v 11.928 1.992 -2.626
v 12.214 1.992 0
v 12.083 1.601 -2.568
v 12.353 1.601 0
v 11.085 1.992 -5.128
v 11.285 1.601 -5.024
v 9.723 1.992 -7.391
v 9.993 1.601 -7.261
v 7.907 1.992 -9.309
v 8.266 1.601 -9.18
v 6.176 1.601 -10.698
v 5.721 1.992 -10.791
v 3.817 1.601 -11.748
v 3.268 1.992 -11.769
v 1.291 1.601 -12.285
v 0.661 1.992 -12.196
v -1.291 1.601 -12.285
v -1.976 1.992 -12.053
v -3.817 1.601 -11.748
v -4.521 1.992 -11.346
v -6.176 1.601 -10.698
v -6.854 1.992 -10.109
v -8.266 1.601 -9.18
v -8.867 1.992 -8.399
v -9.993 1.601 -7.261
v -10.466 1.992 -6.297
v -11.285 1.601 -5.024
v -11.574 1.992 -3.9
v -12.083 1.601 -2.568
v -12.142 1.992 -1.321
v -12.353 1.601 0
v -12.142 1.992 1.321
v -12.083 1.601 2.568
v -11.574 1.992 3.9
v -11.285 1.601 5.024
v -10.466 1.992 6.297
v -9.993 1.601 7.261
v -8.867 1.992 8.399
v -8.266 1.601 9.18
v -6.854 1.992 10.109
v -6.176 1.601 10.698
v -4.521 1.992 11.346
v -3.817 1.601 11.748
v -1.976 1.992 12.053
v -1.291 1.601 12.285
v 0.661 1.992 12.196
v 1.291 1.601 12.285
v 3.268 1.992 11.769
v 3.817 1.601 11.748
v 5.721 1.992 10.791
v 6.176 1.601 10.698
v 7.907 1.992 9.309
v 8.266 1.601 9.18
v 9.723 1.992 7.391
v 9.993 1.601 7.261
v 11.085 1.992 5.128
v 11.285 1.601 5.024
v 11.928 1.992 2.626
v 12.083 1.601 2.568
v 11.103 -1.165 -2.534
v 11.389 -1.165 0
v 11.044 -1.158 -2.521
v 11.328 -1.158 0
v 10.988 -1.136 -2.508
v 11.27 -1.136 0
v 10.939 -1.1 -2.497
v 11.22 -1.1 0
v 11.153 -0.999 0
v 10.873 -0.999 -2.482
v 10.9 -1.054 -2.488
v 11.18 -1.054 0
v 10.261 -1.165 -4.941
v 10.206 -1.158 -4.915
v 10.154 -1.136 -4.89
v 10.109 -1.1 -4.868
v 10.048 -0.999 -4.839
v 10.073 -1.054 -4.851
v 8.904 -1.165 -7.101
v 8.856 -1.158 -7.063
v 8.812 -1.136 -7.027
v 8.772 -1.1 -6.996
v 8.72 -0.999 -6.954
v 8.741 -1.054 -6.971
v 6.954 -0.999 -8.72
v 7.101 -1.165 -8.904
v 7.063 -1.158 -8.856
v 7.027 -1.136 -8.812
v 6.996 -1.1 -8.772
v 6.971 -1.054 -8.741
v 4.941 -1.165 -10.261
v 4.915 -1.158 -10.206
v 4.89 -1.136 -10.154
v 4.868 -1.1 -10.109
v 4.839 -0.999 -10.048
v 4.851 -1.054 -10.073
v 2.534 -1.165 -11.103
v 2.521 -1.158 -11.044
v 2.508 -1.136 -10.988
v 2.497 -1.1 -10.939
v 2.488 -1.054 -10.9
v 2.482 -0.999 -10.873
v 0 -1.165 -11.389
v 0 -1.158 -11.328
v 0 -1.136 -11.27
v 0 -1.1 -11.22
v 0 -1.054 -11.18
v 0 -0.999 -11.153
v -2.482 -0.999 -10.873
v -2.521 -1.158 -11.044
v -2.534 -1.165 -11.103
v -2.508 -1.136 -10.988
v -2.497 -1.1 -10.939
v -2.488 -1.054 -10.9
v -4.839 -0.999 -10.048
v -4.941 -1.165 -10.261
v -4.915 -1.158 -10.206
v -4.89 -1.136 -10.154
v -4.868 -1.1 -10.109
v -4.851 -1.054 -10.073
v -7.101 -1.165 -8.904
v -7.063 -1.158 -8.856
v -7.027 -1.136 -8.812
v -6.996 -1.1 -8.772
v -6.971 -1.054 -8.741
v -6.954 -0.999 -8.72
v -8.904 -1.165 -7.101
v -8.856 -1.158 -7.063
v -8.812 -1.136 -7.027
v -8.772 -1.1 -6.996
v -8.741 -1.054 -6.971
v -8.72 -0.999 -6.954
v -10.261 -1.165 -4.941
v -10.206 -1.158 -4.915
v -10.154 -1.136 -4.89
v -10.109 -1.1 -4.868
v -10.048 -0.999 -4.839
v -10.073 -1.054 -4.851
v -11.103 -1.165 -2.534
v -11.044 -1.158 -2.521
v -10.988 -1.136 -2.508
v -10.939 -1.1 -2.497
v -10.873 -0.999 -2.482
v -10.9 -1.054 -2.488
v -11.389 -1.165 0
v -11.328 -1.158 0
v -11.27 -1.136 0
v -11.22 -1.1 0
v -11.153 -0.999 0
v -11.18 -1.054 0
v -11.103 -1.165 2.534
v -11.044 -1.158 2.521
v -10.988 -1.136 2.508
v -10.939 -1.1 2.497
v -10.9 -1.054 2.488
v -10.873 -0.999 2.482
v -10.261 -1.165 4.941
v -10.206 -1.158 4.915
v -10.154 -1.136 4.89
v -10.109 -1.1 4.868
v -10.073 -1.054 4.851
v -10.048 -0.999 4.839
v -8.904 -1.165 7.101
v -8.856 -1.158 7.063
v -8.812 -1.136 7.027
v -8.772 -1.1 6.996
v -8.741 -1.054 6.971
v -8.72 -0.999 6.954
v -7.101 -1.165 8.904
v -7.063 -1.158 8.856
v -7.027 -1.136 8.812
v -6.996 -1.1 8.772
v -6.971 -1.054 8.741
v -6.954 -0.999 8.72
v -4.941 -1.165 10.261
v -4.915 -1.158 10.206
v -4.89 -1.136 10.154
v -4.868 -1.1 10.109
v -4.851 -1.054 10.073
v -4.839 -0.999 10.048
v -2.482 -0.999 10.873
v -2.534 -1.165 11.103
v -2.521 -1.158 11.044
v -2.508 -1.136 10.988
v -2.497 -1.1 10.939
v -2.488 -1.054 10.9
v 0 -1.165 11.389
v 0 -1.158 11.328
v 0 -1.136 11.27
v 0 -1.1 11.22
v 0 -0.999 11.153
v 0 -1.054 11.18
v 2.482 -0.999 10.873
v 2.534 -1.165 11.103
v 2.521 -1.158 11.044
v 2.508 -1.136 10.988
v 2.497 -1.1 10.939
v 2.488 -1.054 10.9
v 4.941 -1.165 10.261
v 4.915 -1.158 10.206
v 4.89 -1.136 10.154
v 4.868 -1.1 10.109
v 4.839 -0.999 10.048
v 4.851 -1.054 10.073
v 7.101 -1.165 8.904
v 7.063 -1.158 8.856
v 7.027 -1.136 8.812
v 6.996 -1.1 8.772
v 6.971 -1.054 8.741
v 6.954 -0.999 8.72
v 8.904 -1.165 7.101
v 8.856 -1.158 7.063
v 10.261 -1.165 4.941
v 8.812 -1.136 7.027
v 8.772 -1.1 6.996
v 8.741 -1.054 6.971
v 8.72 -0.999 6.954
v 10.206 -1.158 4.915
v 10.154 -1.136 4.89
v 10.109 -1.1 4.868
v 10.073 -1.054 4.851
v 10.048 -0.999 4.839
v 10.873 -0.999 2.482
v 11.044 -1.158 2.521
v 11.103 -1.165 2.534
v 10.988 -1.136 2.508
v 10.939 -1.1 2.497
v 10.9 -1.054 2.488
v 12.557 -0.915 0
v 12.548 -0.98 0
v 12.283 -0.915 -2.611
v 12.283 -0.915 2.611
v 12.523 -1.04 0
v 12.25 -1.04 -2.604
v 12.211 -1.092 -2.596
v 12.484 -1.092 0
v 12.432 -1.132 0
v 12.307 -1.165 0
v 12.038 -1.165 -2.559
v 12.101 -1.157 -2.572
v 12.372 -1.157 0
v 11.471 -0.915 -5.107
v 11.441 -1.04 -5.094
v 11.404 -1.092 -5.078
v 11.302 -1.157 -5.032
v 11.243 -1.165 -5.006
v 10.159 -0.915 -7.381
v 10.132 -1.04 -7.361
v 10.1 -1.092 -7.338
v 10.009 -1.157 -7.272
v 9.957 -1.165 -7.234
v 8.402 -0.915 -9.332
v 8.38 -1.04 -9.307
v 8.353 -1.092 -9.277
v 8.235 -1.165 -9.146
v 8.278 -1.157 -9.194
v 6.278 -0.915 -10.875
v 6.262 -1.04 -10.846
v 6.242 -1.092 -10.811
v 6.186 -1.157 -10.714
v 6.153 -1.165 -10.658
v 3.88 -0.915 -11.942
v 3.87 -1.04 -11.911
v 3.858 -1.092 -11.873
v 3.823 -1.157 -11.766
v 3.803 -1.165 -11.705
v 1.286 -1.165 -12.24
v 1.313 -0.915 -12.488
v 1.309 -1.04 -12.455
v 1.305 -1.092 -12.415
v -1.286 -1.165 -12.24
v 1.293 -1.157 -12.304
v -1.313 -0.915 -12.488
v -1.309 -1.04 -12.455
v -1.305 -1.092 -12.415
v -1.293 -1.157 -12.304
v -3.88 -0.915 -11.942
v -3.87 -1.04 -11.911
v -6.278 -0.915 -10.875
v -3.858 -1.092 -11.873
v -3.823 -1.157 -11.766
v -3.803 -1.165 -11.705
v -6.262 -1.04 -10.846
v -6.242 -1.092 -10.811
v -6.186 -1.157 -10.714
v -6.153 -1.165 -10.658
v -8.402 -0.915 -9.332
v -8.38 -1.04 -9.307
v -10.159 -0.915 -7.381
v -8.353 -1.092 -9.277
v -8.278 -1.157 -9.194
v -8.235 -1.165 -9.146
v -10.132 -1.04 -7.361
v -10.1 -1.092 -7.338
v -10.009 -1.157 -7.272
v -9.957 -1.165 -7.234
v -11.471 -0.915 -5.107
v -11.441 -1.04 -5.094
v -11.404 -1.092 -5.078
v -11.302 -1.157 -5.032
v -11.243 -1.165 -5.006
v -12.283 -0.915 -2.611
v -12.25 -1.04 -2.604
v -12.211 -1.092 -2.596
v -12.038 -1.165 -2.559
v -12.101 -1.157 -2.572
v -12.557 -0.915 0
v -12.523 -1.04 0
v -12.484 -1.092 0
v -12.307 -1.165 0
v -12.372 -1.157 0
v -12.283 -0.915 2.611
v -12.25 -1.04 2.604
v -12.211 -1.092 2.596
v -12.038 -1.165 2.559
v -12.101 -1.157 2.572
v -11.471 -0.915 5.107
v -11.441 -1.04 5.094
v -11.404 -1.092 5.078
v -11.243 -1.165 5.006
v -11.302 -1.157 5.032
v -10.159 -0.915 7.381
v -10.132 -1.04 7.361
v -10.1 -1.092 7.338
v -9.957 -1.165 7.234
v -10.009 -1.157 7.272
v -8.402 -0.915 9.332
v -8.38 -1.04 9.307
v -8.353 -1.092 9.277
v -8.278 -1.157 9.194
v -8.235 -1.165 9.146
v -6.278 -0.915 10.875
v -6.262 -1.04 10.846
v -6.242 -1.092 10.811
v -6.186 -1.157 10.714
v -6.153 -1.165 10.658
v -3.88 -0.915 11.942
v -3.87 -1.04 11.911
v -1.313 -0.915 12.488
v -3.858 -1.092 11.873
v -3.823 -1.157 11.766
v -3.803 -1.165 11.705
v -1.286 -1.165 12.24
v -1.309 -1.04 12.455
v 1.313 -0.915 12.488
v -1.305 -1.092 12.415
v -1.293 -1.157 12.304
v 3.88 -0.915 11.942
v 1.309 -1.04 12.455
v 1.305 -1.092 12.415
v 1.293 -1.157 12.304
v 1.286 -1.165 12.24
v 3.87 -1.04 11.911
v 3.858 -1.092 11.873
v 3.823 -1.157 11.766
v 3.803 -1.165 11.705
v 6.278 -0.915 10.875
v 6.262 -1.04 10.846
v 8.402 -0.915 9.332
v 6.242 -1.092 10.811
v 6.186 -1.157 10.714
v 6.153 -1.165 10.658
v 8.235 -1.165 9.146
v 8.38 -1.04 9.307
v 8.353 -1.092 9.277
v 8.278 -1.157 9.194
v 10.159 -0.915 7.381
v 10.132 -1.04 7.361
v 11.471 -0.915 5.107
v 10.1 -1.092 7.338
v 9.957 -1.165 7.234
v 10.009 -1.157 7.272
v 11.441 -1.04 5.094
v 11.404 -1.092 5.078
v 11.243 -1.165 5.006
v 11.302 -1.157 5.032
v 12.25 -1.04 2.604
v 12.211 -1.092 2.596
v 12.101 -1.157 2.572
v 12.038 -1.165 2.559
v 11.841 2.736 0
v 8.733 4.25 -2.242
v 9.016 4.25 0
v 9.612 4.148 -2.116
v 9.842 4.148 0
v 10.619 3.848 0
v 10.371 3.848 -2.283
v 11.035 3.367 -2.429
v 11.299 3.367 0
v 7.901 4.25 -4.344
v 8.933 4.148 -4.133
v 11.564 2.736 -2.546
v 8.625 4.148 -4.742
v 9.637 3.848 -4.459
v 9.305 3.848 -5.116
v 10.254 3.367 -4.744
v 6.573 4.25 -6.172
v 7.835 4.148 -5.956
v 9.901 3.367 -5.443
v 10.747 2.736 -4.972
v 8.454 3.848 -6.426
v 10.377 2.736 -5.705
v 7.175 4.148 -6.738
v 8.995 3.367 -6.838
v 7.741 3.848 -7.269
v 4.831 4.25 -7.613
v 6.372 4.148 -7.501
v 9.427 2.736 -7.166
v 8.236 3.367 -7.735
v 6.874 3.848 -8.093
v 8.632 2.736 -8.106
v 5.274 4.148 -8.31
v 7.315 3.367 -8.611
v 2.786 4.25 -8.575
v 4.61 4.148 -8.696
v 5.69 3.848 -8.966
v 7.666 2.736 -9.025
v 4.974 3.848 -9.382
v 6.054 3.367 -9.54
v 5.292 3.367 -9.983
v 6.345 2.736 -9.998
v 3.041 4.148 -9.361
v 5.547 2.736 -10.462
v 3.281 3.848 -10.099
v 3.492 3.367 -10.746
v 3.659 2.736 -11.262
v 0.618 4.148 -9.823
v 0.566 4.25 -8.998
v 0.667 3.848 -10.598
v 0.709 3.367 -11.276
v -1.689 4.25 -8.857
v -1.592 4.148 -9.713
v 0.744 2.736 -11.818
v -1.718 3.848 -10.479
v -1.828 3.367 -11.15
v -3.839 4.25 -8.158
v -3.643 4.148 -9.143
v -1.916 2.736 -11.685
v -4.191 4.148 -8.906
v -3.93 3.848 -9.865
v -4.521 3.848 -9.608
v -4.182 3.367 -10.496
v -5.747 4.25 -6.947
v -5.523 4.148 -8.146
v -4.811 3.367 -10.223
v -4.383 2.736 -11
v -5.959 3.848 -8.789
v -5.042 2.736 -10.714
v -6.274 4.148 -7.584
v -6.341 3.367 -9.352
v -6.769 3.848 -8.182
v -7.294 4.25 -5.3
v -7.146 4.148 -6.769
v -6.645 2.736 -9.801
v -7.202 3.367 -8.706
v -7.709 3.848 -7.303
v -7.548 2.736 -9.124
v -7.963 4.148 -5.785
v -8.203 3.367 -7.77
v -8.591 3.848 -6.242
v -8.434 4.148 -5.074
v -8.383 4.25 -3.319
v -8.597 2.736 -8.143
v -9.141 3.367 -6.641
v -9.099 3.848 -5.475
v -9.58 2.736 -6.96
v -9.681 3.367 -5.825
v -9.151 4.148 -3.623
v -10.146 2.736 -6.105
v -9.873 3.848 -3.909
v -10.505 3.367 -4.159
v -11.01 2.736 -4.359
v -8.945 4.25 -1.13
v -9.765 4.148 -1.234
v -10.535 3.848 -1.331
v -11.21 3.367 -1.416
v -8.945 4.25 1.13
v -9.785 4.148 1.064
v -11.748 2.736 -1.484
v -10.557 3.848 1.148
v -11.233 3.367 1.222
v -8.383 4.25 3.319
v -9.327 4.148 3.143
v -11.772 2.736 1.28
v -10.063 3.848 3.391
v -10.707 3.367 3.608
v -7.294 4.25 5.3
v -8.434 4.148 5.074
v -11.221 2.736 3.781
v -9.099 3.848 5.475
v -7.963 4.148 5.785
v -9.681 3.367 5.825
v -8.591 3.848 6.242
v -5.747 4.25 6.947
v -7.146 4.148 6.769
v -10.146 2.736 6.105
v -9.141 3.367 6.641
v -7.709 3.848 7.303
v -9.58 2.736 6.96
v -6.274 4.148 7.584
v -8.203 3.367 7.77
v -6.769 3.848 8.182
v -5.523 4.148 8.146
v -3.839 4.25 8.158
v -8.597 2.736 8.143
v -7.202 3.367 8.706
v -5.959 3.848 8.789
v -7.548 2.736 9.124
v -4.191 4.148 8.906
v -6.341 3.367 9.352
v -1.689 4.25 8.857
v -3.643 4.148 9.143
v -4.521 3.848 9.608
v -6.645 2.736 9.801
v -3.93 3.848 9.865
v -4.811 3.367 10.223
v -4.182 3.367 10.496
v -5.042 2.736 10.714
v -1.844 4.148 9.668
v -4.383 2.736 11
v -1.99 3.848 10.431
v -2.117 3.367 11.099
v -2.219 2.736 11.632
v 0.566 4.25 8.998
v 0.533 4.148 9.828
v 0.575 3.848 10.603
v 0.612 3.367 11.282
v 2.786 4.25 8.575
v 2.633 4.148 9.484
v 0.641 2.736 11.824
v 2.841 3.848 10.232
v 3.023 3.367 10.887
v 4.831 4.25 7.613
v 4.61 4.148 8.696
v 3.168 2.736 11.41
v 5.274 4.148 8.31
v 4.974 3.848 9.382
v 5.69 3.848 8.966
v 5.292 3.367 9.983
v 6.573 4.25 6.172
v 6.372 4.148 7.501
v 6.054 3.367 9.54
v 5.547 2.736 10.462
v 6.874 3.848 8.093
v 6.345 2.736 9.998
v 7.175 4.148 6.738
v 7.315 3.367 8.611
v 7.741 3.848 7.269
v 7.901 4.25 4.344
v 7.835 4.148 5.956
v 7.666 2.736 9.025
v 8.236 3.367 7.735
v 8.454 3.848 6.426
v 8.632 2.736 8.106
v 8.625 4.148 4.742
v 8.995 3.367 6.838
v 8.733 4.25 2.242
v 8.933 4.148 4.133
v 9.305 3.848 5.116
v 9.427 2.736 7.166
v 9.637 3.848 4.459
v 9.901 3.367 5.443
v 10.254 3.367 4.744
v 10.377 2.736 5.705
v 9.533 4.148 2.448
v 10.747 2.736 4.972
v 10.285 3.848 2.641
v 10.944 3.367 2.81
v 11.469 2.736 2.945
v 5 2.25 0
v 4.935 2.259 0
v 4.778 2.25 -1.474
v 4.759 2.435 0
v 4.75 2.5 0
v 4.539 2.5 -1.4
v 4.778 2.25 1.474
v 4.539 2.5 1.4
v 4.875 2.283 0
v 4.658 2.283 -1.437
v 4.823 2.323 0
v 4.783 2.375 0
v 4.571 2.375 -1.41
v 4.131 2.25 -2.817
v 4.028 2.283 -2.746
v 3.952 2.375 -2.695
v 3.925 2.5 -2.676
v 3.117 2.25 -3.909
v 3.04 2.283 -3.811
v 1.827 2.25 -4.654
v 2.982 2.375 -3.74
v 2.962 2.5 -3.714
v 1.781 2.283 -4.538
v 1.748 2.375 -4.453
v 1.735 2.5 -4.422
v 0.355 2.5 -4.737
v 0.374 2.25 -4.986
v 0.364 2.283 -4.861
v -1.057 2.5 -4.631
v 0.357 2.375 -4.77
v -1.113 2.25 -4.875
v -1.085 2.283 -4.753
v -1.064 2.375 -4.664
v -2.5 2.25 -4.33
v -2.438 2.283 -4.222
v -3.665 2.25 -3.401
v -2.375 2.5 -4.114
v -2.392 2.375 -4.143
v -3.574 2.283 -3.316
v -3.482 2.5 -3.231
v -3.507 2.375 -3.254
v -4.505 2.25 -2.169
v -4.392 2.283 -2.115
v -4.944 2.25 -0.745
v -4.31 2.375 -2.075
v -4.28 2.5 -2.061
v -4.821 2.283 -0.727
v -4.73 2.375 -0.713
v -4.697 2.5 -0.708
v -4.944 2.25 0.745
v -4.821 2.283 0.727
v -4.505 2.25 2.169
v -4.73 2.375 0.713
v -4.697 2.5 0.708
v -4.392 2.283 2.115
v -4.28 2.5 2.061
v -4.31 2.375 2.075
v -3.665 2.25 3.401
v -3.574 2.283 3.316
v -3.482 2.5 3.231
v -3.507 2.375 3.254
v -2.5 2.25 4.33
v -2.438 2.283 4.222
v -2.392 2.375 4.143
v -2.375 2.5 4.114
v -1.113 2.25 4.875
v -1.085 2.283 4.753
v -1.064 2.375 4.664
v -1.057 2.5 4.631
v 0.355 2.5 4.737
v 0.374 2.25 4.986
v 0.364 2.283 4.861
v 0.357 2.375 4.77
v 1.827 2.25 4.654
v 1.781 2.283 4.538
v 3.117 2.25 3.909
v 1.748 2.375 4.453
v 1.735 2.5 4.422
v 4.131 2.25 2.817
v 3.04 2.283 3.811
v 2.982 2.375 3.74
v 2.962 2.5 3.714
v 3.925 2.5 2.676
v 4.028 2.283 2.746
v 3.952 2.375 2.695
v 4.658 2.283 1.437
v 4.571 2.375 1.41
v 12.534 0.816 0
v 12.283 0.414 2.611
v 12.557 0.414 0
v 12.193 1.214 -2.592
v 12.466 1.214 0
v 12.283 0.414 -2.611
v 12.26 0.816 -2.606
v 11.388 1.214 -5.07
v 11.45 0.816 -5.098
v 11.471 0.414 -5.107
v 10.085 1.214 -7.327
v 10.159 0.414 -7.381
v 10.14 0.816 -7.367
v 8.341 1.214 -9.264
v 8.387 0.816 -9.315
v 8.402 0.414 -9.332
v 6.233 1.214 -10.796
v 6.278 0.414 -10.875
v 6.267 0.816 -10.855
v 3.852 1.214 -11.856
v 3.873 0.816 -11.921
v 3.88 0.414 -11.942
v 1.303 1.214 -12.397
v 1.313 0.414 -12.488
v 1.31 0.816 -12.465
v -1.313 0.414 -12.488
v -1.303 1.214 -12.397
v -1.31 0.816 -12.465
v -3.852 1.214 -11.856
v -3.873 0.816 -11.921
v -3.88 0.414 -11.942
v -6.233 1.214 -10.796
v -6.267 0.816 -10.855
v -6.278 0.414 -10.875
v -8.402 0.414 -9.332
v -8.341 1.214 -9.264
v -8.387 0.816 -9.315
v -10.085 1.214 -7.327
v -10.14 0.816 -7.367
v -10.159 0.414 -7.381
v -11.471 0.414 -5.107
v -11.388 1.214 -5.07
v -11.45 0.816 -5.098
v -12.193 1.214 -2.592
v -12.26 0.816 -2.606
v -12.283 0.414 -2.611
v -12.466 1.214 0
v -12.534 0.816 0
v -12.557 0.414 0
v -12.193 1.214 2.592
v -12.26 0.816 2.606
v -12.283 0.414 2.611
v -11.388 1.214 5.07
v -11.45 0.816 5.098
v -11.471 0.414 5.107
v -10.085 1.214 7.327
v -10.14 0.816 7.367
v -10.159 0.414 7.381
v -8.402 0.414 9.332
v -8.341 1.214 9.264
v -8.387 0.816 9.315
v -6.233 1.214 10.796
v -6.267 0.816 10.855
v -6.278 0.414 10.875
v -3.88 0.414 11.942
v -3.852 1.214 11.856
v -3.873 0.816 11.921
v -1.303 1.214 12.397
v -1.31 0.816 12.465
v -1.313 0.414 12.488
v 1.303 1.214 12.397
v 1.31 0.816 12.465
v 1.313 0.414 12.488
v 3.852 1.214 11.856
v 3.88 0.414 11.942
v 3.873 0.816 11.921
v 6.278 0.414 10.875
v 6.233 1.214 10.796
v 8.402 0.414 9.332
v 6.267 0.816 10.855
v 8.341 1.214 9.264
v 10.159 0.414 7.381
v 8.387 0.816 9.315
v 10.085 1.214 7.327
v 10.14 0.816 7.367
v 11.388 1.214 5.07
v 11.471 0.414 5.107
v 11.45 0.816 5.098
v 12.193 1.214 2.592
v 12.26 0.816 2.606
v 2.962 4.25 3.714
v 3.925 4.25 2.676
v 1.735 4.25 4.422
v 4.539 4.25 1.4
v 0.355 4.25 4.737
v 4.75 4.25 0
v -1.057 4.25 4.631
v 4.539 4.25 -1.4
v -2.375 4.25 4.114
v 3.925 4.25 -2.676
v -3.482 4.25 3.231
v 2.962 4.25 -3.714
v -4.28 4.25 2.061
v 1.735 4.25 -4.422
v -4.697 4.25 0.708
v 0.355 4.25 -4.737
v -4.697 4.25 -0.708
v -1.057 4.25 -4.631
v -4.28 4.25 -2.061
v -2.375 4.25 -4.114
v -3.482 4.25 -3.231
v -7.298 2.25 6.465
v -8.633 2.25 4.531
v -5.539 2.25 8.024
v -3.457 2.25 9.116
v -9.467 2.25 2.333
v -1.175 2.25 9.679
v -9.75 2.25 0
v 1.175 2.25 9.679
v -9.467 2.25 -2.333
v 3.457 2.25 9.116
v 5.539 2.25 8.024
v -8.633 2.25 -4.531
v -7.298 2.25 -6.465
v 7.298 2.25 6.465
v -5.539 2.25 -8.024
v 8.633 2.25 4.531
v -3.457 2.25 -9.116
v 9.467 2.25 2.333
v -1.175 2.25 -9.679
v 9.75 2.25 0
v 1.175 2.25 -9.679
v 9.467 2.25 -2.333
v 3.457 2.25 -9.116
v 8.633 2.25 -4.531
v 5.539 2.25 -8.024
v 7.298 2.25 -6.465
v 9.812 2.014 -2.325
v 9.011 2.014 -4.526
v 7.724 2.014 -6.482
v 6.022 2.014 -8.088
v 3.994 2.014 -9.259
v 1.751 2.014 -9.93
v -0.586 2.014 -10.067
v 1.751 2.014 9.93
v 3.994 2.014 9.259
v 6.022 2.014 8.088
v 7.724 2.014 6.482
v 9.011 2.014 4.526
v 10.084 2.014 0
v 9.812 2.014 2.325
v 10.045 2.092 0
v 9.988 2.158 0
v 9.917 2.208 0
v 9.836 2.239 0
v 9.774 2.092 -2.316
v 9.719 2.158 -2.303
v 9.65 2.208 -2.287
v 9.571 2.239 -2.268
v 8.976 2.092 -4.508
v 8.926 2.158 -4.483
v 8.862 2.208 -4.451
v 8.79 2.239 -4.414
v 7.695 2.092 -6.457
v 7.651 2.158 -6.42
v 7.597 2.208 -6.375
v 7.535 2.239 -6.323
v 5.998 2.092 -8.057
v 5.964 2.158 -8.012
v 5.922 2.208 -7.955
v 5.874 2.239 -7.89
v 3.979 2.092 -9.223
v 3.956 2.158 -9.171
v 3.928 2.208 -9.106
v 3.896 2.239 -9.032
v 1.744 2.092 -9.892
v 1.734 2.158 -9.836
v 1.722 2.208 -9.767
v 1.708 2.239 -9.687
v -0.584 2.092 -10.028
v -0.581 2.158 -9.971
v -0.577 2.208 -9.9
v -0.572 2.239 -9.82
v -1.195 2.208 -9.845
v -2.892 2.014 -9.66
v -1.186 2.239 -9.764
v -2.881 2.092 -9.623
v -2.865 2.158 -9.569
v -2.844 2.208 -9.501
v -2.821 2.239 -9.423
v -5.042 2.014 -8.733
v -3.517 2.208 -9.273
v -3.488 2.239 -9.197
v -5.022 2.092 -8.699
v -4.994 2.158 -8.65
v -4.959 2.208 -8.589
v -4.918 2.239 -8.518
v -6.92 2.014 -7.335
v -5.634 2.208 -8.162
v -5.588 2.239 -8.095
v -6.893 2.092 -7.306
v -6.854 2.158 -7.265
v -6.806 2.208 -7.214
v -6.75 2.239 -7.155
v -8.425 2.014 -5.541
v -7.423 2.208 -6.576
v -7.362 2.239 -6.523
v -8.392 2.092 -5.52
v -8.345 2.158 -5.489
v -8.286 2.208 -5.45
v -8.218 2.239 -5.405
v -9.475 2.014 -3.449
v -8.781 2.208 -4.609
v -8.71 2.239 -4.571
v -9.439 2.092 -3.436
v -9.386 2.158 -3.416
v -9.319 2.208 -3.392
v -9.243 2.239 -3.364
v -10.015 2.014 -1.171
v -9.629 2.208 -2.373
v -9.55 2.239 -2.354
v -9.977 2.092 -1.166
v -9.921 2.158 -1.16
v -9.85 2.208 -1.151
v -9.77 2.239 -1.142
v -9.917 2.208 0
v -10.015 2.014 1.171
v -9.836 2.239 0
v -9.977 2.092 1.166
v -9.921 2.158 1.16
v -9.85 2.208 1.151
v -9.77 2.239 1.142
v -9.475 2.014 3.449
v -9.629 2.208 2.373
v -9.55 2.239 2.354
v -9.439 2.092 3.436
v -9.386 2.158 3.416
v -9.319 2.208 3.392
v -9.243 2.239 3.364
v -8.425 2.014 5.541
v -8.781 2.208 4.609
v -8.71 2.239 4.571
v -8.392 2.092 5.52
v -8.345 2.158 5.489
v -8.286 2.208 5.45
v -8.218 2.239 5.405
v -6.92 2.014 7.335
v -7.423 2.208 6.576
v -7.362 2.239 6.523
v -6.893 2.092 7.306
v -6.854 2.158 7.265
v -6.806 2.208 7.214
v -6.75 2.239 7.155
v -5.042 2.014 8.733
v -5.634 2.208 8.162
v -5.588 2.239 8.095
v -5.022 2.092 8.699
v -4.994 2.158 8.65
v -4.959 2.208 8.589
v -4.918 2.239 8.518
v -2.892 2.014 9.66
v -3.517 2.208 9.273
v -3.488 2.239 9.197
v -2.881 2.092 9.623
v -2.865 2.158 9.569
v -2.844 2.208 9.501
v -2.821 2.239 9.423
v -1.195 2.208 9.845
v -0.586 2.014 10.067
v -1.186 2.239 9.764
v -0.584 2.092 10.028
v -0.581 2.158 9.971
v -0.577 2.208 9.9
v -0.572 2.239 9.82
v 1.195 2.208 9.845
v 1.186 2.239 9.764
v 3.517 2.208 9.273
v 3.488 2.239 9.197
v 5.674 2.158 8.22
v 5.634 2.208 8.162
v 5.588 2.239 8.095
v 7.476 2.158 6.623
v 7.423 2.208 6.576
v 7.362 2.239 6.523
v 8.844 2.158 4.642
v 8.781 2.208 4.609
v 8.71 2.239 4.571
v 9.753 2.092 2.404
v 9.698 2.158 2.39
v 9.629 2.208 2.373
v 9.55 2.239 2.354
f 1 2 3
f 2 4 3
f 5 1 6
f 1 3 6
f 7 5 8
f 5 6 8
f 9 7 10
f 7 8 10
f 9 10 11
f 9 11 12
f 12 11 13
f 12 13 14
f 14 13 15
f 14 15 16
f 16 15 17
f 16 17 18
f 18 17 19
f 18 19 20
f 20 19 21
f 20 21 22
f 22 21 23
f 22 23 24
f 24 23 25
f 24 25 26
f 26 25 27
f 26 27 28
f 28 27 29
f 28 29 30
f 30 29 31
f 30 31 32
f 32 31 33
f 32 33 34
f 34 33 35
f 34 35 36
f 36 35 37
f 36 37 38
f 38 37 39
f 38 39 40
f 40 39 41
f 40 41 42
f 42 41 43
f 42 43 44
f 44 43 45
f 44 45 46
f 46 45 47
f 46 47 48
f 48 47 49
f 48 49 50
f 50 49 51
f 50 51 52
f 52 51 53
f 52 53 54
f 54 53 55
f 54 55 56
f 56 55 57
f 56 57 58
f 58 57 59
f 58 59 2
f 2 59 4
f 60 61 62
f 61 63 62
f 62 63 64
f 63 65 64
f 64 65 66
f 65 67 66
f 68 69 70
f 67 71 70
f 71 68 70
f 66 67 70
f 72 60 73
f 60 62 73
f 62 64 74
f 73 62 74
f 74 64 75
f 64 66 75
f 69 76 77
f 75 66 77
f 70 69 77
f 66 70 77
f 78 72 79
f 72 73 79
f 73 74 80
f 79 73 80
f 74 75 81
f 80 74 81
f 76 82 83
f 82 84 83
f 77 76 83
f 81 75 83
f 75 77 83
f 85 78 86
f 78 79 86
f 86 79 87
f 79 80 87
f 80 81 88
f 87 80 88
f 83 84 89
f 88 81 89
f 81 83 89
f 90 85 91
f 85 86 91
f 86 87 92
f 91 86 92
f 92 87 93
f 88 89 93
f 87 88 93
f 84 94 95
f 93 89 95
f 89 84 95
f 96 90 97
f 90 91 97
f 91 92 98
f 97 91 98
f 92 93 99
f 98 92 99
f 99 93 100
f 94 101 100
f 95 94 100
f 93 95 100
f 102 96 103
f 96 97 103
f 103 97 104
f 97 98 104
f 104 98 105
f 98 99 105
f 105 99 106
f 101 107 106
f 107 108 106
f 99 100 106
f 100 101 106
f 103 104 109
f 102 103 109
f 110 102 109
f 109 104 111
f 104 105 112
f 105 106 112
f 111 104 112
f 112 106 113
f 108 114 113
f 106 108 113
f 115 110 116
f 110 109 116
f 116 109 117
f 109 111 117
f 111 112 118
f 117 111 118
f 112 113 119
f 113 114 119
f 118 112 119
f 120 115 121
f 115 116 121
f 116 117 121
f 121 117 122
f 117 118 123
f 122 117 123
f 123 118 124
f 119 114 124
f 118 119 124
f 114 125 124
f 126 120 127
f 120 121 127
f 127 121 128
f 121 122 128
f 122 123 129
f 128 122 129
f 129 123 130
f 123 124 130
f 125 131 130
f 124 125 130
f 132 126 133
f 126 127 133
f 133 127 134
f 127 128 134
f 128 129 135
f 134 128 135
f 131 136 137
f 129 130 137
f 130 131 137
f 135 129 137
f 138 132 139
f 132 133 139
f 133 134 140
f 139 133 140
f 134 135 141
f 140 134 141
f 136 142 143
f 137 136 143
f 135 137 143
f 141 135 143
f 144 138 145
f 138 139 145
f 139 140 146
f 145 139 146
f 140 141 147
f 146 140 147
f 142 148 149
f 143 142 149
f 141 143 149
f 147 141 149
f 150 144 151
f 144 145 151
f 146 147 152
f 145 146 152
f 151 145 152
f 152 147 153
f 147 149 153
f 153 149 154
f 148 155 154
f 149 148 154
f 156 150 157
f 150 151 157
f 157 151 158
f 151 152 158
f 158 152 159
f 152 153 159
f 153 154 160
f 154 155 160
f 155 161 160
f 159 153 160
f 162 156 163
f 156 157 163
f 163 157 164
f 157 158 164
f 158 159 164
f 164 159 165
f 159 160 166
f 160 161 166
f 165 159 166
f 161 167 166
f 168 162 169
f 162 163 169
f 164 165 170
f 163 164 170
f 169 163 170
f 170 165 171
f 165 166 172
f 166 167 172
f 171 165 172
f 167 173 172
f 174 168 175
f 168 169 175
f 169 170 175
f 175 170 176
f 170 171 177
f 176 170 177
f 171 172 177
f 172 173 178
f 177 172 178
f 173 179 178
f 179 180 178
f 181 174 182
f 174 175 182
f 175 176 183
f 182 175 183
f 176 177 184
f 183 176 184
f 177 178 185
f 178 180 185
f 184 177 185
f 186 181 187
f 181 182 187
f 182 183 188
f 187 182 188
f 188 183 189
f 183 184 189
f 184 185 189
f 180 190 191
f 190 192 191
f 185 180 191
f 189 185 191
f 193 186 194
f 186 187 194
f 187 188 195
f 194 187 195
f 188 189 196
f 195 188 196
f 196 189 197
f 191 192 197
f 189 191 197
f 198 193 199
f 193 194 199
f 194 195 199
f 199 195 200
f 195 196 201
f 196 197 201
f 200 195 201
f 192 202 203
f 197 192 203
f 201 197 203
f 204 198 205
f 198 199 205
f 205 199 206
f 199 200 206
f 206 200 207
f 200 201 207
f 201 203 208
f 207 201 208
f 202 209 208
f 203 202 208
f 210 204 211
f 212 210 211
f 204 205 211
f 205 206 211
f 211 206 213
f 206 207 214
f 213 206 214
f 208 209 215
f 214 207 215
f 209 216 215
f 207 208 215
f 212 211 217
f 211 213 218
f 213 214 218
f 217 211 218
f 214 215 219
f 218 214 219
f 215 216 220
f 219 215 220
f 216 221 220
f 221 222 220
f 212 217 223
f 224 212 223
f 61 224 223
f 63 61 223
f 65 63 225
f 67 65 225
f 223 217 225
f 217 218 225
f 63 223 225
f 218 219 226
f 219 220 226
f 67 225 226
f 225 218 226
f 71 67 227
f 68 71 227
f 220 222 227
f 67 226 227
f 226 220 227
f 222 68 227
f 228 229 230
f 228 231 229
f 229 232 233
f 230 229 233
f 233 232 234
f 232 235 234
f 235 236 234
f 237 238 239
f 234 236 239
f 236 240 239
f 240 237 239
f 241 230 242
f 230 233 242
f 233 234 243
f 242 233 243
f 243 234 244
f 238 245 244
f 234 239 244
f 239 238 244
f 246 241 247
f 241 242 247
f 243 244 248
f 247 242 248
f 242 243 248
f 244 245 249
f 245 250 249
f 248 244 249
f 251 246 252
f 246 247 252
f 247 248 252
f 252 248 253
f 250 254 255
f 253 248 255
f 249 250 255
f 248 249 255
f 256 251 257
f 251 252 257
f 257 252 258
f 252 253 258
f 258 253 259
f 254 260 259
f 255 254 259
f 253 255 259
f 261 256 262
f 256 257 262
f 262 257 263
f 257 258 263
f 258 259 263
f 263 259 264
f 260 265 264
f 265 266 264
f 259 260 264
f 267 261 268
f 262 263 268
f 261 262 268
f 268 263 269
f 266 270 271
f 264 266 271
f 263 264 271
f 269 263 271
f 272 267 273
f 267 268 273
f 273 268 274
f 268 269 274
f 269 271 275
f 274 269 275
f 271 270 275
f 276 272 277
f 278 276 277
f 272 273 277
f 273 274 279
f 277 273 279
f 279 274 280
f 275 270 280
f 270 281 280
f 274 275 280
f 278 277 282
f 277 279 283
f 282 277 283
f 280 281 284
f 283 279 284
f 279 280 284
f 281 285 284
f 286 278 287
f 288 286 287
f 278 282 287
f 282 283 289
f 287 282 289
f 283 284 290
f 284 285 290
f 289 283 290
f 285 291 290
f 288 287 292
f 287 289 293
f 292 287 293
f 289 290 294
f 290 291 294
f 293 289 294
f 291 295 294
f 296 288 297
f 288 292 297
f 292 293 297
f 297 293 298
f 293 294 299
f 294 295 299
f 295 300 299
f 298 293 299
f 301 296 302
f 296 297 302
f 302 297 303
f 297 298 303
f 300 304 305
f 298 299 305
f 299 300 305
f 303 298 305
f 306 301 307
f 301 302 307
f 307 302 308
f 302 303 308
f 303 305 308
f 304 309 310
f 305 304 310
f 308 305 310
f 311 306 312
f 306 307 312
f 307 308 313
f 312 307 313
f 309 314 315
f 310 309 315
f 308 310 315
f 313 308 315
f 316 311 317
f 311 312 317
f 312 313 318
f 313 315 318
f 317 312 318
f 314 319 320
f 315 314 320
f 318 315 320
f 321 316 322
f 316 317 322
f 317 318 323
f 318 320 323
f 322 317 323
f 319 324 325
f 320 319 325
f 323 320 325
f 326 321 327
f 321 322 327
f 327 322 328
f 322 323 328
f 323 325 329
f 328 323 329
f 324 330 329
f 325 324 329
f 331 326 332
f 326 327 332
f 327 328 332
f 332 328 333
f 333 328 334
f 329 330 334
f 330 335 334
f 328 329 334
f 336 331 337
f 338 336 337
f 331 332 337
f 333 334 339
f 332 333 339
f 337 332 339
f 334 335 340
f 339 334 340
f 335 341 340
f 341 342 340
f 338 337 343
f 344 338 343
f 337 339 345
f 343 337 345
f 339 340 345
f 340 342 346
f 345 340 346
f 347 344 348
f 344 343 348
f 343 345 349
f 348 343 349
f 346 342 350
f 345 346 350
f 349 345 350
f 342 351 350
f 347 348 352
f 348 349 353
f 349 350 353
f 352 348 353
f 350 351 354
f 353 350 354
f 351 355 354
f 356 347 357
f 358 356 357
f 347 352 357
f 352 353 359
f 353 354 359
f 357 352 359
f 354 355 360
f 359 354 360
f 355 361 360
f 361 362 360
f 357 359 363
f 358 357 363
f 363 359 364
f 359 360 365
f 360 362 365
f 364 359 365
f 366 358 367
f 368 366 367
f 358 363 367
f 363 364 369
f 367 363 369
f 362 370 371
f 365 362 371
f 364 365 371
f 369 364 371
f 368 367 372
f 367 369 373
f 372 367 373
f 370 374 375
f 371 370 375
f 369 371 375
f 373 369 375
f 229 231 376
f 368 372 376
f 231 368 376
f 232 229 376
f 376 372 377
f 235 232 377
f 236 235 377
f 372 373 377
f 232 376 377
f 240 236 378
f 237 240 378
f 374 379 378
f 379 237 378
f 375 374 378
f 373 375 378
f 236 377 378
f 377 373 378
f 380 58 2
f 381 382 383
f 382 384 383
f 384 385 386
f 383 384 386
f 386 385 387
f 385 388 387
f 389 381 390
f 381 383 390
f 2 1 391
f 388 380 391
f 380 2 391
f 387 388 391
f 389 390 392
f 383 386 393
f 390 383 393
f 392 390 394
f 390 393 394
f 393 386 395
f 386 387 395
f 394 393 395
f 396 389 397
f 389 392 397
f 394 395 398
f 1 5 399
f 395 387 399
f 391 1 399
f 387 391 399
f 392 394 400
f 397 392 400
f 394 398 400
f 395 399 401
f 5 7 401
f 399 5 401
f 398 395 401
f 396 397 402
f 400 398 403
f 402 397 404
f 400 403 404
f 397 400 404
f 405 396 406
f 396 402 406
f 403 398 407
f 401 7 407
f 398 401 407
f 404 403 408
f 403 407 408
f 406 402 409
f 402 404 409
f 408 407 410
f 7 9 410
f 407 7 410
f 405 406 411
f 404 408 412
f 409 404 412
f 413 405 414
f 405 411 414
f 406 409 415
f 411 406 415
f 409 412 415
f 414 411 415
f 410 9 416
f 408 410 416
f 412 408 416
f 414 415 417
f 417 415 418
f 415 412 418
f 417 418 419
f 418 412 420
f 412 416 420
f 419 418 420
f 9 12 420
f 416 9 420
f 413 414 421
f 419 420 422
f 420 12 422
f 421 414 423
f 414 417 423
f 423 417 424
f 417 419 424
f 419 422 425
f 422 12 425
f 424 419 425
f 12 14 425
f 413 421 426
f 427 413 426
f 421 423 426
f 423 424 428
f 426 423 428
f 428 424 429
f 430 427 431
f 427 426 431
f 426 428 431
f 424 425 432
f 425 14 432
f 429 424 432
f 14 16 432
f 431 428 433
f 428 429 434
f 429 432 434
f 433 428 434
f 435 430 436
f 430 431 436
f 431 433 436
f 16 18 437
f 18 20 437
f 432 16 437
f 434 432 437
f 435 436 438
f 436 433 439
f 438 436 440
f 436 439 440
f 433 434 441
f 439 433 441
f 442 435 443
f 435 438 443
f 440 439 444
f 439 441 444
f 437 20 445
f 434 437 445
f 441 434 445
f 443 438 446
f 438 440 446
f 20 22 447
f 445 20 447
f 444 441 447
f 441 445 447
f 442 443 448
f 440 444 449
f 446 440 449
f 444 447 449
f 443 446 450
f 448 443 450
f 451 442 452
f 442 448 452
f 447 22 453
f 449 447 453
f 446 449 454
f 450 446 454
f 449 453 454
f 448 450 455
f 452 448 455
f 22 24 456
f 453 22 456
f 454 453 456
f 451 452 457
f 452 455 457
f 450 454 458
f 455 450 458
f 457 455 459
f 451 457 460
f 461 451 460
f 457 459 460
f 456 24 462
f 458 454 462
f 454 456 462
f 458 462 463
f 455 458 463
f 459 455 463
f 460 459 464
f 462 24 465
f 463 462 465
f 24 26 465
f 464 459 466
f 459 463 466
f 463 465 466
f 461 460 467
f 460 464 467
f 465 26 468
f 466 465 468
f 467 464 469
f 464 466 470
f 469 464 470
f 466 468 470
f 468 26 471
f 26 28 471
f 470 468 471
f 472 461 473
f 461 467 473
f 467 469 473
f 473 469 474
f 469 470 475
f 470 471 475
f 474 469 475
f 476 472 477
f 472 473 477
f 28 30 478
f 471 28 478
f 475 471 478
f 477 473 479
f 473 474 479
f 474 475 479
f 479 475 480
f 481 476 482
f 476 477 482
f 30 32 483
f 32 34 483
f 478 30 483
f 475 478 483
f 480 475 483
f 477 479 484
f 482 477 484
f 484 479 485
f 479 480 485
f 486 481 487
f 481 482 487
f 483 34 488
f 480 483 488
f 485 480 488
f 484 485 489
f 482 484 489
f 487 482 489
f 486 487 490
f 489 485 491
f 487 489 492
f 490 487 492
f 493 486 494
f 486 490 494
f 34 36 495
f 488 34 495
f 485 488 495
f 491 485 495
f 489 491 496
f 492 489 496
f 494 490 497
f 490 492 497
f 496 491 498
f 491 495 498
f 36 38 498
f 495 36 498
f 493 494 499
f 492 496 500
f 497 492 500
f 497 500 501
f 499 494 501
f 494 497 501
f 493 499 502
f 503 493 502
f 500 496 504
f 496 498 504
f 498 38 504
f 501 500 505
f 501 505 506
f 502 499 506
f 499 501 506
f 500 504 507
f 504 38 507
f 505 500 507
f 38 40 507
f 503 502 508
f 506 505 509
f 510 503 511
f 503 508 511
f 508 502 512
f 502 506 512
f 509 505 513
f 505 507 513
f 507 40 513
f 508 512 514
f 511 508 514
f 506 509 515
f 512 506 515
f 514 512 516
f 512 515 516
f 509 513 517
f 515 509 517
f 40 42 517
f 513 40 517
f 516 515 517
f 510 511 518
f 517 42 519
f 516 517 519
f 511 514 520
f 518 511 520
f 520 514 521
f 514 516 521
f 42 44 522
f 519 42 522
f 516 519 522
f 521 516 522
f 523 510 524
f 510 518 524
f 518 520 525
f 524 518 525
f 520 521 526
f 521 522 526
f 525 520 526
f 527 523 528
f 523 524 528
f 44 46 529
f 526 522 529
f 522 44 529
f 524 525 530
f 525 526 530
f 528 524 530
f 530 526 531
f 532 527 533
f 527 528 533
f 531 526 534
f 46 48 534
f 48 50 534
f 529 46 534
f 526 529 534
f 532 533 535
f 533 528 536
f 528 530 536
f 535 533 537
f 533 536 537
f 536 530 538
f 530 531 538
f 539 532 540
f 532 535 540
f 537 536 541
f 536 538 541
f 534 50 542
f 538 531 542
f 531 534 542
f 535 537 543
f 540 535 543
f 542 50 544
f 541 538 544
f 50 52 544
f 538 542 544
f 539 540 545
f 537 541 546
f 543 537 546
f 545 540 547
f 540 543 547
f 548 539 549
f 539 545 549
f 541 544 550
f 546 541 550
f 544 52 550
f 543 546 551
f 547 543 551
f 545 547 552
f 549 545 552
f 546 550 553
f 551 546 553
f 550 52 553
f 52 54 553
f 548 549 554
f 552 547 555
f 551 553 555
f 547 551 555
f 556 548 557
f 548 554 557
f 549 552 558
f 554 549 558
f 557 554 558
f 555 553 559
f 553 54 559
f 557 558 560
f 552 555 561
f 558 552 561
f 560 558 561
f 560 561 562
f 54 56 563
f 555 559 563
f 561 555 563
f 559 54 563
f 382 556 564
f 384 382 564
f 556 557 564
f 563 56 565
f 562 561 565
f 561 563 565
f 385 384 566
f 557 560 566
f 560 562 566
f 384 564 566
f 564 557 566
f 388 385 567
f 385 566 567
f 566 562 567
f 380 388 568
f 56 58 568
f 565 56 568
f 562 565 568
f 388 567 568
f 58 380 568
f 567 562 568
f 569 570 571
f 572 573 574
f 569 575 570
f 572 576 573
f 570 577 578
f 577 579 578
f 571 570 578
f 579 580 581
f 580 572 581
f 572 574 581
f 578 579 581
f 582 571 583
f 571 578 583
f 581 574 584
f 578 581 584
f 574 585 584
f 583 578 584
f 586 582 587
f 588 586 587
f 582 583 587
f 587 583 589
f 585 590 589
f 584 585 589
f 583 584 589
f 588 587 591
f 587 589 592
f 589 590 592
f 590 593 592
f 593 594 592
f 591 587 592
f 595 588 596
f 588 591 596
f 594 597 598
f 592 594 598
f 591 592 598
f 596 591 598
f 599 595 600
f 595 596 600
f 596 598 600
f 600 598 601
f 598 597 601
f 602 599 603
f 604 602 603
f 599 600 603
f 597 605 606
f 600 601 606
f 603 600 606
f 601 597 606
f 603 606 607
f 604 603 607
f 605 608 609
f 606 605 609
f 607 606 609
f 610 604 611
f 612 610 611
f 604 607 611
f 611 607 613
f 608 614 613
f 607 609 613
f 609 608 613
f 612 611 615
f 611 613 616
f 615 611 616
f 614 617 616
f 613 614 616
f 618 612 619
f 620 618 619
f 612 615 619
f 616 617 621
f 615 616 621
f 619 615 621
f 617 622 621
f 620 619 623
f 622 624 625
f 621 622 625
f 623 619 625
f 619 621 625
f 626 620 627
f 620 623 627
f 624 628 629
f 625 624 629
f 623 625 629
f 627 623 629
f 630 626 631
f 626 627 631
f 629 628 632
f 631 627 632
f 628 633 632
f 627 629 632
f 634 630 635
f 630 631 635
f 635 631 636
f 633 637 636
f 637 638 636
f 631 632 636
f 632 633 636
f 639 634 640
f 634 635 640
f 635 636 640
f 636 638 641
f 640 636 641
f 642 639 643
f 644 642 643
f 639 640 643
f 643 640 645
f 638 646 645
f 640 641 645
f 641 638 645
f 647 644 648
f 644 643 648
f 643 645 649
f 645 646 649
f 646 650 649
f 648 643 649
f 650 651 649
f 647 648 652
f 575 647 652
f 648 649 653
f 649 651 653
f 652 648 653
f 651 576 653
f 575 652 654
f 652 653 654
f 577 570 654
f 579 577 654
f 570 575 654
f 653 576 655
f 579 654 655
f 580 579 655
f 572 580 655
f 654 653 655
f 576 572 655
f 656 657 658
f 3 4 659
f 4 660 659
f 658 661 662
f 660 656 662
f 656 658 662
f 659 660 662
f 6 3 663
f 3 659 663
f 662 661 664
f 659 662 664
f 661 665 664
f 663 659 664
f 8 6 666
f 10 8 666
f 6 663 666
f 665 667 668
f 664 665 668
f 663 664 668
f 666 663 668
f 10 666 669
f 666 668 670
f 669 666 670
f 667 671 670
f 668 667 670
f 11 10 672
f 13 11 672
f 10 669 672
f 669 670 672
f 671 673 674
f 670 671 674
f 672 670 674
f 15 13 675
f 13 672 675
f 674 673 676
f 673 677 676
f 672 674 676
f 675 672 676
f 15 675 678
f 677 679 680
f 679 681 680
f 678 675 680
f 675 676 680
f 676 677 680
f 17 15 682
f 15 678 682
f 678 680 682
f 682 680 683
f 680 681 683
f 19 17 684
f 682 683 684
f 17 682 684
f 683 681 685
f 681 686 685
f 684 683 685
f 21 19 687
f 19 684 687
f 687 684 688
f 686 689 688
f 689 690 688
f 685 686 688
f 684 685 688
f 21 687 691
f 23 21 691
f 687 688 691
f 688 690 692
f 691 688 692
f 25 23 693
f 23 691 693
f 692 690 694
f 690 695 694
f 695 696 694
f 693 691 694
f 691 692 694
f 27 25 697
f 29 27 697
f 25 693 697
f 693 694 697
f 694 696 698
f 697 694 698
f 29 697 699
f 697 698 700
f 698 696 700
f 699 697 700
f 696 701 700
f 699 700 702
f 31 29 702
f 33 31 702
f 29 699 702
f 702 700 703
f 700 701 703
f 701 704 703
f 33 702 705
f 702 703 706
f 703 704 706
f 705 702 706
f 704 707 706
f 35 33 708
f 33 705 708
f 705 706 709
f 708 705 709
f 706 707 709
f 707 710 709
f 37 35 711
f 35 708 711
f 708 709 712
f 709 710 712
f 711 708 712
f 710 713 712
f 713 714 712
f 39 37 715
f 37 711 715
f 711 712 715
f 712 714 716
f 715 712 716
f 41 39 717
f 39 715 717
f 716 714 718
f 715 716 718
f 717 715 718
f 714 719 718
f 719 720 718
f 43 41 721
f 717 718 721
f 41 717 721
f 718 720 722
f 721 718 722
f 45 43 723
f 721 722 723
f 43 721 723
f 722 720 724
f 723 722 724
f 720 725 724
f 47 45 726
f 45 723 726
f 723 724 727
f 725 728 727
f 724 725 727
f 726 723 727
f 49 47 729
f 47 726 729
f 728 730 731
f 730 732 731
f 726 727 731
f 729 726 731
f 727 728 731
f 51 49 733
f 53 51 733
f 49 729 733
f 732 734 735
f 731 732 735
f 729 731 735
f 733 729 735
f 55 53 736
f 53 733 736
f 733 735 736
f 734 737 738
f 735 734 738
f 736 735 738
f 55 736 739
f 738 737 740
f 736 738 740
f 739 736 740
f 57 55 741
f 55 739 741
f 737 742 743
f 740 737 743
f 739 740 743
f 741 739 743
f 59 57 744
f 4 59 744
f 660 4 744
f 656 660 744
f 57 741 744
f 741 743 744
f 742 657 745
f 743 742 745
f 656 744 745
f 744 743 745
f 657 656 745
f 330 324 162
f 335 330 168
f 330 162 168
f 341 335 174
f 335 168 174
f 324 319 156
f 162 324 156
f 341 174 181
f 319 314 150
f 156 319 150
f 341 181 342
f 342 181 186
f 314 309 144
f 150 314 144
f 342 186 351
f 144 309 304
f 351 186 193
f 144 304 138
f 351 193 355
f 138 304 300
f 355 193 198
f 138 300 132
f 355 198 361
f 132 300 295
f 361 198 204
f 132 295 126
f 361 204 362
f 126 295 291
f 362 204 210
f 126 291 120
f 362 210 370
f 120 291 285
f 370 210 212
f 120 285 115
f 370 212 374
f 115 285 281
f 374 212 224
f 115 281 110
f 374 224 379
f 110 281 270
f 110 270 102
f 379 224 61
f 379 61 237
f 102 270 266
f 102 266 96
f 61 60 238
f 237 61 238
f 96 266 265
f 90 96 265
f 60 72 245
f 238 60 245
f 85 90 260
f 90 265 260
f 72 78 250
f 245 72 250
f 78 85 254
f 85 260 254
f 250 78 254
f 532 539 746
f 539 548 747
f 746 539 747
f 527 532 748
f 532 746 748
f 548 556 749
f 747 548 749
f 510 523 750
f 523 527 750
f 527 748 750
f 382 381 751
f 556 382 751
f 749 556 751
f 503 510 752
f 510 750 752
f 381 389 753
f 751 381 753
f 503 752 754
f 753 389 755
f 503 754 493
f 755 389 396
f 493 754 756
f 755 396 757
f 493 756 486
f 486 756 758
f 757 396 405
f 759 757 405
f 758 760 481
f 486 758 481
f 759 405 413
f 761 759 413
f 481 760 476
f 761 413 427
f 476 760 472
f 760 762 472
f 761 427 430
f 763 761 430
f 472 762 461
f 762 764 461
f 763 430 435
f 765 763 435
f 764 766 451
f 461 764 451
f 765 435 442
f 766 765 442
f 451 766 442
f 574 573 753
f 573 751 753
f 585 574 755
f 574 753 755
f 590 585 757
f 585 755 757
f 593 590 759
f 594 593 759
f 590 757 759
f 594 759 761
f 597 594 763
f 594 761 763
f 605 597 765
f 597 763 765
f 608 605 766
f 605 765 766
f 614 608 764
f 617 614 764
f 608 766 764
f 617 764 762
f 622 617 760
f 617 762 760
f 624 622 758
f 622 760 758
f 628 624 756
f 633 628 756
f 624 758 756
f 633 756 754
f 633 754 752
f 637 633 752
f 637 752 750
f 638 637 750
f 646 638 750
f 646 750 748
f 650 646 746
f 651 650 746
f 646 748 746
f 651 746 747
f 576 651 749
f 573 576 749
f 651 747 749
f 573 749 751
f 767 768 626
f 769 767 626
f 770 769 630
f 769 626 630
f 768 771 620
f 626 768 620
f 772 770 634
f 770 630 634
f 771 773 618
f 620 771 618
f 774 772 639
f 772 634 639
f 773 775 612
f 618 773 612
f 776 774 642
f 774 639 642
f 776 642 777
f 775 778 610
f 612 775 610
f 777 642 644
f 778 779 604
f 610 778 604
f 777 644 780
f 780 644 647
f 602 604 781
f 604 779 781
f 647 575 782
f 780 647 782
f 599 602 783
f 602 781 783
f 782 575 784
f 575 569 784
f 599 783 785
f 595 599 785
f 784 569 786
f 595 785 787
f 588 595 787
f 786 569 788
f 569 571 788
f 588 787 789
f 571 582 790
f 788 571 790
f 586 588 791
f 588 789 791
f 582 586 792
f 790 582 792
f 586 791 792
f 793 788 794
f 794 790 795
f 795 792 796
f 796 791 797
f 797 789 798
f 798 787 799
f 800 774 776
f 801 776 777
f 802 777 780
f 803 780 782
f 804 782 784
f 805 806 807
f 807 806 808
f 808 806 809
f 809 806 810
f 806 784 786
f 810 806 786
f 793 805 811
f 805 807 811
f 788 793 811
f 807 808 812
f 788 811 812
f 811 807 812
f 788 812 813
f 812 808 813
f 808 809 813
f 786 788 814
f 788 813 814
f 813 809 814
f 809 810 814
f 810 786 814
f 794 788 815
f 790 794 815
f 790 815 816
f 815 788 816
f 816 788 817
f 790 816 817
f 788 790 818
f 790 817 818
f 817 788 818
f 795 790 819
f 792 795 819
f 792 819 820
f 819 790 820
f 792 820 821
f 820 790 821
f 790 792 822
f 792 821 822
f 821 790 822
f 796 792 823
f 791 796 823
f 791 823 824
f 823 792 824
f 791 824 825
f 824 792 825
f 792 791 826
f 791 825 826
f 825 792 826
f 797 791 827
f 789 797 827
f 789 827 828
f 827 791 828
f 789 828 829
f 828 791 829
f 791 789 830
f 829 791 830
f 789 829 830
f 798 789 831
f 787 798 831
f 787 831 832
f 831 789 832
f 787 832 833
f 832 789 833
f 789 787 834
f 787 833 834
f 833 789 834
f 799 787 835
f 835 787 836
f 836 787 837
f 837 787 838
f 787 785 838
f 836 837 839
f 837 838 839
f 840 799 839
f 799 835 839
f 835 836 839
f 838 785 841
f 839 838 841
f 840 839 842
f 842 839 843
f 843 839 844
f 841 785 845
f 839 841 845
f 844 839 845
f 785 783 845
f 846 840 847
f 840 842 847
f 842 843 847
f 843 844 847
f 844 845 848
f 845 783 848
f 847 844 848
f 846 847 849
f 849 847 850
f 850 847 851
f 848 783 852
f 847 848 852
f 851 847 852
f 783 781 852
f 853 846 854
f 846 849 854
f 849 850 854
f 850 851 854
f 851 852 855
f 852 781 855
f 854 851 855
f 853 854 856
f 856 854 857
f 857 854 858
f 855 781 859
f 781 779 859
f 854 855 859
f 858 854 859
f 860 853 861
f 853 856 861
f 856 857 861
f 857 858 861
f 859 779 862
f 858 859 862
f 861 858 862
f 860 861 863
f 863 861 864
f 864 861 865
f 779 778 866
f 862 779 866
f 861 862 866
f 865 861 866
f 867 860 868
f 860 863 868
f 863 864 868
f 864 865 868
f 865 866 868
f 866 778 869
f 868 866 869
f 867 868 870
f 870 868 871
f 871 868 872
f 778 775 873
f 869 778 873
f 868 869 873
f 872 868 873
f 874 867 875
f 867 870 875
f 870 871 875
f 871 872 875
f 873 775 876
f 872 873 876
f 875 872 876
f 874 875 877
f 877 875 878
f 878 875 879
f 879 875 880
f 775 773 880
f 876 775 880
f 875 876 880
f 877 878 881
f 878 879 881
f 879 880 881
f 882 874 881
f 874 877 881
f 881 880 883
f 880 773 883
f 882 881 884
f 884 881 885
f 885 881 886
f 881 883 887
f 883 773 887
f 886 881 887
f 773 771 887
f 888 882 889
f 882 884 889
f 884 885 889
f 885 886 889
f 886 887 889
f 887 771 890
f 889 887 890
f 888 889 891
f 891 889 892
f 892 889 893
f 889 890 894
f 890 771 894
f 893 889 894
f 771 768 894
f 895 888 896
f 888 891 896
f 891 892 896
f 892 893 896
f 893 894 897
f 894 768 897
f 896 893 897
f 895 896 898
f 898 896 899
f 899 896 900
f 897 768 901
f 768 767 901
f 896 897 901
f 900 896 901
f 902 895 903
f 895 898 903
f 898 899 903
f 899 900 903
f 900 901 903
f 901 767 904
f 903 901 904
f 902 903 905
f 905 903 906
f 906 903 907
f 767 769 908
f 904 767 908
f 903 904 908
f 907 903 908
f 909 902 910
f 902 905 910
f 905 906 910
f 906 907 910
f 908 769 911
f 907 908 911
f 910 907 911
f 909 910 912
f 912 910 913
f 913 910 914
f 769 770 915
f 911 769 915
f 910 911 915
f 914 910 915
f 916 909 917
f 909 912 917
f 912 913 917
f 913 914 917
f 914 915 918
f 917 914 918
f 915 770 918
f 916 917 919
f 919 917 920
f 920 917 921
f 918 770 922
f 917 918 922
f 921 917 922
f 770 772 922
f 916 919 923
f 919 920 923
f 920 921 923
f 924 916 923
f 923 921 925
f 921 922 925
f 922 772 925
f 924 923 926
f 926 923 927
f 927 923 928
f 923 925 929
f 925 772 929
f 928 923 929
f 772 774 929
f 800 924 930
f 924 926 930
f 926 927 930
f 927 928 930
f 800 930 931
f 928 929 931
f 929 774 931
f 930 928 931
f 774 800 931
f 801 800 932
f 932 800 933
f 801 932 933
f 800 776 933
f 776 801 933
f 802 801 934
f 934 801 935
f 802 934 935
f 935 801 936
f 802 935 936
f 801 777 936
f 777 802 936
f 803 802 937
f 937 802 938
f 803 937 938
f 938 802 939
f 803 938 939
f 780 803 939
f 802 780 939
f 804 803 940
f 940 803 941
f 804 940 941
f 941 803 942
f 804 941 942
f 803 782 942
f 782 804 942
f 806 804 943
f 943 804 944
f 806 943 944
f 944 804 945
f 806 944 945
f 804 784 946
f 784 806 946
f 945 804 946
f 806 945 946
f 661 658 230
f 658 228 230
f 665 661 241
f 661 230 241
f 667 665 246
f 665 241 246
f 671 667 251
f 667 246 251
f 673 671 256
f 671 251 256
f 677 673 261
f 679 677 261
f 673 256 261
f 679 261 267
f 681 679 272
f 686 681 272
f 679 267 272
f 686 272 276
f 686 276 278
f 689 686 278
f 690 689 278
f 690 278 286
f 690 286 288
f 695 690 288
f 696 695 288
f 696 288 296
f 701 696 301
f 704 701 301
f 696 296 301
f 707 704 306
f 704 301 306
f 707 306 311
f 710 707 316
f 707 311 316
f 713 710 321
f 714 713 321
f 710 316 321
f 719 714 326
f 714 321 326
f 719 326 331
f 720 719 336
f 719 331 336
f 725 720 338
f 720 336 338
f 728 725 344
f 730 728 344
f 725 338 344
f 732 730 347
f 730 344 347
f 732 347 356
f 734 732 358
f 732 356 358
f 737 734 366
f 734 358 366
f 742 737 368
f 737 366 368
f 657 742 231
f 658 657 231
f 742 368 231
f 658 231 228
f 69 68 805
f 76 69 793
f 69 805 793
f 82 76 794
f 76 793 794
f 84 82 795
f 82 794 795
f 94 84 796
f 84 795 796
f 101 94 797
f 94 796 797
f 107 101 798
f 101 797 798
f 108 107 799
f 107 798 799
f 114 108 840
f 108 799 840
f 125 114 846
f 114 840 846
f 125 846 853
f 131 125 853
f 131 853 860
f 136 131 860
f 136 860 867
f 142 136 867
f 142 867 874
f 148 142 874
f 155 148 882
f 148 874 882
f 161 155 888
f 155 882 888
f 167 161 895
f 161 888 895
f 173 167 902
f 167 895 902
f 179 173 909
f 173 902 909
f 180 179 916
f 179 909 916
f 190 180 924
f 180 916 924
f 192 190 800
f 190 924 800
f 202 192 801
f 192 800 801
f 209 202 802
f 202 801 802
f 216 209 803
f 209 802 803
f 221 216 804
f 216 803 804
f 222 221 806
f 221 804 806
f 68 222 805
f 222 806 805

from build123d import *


with BuildPart() as part:
    # Sketch1 → Revolve1 (revolve)
    with BuildSketch(Plane.XY):
        with BuildLine():
            Line((4.75, 4.25), (9.016237468, 4.25))
            ThreePointArc((9.016237468, 4.25), (10.973568282, 3.628502604), (12.213835367, 1.991694585))
            Line((12.213835367, 1.991694585), (12.352608297, 1.600607236))
            ThreePointArc((12.352608297, 1.600607236), (12.505509699, 1.015806617), (12.55697426, 0.413542553))
            Line((12.55697426, 0.413542553), (12.55697426, -0.91549471))
            ThreePointArc((12.55697426, -0.91549471), (12.483750956, -1.092271405), (12.30697426, -1.16549471))
            Line((12.30697426, -1.16549471), (11.388512384, -1.16549471))
            ThreePointArc((11.388512384, -1.16549471), (11.2442914, -1.119701242), (11.152905448, -0.999097171))
            Line((11.152905448, -0.999097171), (10.083602461, 2.014393064))
            ThreePointArc((10.083602461, 2.014393064), (9.954206532, 2.185159746), (9.75, 2.25))
            Line((9.75, 2.25), (5, 2.25))
            ThreePointArc((5, 2.25), (4.823223305, 2.323223305), (4.75, 2.5))
            Line((4.75, 2.5), (4.75, 4.25))
        make_face()
    revolve(axis=Axis((0, -4.993282938, 0), (0, 1, 0)))


solid = part.part
